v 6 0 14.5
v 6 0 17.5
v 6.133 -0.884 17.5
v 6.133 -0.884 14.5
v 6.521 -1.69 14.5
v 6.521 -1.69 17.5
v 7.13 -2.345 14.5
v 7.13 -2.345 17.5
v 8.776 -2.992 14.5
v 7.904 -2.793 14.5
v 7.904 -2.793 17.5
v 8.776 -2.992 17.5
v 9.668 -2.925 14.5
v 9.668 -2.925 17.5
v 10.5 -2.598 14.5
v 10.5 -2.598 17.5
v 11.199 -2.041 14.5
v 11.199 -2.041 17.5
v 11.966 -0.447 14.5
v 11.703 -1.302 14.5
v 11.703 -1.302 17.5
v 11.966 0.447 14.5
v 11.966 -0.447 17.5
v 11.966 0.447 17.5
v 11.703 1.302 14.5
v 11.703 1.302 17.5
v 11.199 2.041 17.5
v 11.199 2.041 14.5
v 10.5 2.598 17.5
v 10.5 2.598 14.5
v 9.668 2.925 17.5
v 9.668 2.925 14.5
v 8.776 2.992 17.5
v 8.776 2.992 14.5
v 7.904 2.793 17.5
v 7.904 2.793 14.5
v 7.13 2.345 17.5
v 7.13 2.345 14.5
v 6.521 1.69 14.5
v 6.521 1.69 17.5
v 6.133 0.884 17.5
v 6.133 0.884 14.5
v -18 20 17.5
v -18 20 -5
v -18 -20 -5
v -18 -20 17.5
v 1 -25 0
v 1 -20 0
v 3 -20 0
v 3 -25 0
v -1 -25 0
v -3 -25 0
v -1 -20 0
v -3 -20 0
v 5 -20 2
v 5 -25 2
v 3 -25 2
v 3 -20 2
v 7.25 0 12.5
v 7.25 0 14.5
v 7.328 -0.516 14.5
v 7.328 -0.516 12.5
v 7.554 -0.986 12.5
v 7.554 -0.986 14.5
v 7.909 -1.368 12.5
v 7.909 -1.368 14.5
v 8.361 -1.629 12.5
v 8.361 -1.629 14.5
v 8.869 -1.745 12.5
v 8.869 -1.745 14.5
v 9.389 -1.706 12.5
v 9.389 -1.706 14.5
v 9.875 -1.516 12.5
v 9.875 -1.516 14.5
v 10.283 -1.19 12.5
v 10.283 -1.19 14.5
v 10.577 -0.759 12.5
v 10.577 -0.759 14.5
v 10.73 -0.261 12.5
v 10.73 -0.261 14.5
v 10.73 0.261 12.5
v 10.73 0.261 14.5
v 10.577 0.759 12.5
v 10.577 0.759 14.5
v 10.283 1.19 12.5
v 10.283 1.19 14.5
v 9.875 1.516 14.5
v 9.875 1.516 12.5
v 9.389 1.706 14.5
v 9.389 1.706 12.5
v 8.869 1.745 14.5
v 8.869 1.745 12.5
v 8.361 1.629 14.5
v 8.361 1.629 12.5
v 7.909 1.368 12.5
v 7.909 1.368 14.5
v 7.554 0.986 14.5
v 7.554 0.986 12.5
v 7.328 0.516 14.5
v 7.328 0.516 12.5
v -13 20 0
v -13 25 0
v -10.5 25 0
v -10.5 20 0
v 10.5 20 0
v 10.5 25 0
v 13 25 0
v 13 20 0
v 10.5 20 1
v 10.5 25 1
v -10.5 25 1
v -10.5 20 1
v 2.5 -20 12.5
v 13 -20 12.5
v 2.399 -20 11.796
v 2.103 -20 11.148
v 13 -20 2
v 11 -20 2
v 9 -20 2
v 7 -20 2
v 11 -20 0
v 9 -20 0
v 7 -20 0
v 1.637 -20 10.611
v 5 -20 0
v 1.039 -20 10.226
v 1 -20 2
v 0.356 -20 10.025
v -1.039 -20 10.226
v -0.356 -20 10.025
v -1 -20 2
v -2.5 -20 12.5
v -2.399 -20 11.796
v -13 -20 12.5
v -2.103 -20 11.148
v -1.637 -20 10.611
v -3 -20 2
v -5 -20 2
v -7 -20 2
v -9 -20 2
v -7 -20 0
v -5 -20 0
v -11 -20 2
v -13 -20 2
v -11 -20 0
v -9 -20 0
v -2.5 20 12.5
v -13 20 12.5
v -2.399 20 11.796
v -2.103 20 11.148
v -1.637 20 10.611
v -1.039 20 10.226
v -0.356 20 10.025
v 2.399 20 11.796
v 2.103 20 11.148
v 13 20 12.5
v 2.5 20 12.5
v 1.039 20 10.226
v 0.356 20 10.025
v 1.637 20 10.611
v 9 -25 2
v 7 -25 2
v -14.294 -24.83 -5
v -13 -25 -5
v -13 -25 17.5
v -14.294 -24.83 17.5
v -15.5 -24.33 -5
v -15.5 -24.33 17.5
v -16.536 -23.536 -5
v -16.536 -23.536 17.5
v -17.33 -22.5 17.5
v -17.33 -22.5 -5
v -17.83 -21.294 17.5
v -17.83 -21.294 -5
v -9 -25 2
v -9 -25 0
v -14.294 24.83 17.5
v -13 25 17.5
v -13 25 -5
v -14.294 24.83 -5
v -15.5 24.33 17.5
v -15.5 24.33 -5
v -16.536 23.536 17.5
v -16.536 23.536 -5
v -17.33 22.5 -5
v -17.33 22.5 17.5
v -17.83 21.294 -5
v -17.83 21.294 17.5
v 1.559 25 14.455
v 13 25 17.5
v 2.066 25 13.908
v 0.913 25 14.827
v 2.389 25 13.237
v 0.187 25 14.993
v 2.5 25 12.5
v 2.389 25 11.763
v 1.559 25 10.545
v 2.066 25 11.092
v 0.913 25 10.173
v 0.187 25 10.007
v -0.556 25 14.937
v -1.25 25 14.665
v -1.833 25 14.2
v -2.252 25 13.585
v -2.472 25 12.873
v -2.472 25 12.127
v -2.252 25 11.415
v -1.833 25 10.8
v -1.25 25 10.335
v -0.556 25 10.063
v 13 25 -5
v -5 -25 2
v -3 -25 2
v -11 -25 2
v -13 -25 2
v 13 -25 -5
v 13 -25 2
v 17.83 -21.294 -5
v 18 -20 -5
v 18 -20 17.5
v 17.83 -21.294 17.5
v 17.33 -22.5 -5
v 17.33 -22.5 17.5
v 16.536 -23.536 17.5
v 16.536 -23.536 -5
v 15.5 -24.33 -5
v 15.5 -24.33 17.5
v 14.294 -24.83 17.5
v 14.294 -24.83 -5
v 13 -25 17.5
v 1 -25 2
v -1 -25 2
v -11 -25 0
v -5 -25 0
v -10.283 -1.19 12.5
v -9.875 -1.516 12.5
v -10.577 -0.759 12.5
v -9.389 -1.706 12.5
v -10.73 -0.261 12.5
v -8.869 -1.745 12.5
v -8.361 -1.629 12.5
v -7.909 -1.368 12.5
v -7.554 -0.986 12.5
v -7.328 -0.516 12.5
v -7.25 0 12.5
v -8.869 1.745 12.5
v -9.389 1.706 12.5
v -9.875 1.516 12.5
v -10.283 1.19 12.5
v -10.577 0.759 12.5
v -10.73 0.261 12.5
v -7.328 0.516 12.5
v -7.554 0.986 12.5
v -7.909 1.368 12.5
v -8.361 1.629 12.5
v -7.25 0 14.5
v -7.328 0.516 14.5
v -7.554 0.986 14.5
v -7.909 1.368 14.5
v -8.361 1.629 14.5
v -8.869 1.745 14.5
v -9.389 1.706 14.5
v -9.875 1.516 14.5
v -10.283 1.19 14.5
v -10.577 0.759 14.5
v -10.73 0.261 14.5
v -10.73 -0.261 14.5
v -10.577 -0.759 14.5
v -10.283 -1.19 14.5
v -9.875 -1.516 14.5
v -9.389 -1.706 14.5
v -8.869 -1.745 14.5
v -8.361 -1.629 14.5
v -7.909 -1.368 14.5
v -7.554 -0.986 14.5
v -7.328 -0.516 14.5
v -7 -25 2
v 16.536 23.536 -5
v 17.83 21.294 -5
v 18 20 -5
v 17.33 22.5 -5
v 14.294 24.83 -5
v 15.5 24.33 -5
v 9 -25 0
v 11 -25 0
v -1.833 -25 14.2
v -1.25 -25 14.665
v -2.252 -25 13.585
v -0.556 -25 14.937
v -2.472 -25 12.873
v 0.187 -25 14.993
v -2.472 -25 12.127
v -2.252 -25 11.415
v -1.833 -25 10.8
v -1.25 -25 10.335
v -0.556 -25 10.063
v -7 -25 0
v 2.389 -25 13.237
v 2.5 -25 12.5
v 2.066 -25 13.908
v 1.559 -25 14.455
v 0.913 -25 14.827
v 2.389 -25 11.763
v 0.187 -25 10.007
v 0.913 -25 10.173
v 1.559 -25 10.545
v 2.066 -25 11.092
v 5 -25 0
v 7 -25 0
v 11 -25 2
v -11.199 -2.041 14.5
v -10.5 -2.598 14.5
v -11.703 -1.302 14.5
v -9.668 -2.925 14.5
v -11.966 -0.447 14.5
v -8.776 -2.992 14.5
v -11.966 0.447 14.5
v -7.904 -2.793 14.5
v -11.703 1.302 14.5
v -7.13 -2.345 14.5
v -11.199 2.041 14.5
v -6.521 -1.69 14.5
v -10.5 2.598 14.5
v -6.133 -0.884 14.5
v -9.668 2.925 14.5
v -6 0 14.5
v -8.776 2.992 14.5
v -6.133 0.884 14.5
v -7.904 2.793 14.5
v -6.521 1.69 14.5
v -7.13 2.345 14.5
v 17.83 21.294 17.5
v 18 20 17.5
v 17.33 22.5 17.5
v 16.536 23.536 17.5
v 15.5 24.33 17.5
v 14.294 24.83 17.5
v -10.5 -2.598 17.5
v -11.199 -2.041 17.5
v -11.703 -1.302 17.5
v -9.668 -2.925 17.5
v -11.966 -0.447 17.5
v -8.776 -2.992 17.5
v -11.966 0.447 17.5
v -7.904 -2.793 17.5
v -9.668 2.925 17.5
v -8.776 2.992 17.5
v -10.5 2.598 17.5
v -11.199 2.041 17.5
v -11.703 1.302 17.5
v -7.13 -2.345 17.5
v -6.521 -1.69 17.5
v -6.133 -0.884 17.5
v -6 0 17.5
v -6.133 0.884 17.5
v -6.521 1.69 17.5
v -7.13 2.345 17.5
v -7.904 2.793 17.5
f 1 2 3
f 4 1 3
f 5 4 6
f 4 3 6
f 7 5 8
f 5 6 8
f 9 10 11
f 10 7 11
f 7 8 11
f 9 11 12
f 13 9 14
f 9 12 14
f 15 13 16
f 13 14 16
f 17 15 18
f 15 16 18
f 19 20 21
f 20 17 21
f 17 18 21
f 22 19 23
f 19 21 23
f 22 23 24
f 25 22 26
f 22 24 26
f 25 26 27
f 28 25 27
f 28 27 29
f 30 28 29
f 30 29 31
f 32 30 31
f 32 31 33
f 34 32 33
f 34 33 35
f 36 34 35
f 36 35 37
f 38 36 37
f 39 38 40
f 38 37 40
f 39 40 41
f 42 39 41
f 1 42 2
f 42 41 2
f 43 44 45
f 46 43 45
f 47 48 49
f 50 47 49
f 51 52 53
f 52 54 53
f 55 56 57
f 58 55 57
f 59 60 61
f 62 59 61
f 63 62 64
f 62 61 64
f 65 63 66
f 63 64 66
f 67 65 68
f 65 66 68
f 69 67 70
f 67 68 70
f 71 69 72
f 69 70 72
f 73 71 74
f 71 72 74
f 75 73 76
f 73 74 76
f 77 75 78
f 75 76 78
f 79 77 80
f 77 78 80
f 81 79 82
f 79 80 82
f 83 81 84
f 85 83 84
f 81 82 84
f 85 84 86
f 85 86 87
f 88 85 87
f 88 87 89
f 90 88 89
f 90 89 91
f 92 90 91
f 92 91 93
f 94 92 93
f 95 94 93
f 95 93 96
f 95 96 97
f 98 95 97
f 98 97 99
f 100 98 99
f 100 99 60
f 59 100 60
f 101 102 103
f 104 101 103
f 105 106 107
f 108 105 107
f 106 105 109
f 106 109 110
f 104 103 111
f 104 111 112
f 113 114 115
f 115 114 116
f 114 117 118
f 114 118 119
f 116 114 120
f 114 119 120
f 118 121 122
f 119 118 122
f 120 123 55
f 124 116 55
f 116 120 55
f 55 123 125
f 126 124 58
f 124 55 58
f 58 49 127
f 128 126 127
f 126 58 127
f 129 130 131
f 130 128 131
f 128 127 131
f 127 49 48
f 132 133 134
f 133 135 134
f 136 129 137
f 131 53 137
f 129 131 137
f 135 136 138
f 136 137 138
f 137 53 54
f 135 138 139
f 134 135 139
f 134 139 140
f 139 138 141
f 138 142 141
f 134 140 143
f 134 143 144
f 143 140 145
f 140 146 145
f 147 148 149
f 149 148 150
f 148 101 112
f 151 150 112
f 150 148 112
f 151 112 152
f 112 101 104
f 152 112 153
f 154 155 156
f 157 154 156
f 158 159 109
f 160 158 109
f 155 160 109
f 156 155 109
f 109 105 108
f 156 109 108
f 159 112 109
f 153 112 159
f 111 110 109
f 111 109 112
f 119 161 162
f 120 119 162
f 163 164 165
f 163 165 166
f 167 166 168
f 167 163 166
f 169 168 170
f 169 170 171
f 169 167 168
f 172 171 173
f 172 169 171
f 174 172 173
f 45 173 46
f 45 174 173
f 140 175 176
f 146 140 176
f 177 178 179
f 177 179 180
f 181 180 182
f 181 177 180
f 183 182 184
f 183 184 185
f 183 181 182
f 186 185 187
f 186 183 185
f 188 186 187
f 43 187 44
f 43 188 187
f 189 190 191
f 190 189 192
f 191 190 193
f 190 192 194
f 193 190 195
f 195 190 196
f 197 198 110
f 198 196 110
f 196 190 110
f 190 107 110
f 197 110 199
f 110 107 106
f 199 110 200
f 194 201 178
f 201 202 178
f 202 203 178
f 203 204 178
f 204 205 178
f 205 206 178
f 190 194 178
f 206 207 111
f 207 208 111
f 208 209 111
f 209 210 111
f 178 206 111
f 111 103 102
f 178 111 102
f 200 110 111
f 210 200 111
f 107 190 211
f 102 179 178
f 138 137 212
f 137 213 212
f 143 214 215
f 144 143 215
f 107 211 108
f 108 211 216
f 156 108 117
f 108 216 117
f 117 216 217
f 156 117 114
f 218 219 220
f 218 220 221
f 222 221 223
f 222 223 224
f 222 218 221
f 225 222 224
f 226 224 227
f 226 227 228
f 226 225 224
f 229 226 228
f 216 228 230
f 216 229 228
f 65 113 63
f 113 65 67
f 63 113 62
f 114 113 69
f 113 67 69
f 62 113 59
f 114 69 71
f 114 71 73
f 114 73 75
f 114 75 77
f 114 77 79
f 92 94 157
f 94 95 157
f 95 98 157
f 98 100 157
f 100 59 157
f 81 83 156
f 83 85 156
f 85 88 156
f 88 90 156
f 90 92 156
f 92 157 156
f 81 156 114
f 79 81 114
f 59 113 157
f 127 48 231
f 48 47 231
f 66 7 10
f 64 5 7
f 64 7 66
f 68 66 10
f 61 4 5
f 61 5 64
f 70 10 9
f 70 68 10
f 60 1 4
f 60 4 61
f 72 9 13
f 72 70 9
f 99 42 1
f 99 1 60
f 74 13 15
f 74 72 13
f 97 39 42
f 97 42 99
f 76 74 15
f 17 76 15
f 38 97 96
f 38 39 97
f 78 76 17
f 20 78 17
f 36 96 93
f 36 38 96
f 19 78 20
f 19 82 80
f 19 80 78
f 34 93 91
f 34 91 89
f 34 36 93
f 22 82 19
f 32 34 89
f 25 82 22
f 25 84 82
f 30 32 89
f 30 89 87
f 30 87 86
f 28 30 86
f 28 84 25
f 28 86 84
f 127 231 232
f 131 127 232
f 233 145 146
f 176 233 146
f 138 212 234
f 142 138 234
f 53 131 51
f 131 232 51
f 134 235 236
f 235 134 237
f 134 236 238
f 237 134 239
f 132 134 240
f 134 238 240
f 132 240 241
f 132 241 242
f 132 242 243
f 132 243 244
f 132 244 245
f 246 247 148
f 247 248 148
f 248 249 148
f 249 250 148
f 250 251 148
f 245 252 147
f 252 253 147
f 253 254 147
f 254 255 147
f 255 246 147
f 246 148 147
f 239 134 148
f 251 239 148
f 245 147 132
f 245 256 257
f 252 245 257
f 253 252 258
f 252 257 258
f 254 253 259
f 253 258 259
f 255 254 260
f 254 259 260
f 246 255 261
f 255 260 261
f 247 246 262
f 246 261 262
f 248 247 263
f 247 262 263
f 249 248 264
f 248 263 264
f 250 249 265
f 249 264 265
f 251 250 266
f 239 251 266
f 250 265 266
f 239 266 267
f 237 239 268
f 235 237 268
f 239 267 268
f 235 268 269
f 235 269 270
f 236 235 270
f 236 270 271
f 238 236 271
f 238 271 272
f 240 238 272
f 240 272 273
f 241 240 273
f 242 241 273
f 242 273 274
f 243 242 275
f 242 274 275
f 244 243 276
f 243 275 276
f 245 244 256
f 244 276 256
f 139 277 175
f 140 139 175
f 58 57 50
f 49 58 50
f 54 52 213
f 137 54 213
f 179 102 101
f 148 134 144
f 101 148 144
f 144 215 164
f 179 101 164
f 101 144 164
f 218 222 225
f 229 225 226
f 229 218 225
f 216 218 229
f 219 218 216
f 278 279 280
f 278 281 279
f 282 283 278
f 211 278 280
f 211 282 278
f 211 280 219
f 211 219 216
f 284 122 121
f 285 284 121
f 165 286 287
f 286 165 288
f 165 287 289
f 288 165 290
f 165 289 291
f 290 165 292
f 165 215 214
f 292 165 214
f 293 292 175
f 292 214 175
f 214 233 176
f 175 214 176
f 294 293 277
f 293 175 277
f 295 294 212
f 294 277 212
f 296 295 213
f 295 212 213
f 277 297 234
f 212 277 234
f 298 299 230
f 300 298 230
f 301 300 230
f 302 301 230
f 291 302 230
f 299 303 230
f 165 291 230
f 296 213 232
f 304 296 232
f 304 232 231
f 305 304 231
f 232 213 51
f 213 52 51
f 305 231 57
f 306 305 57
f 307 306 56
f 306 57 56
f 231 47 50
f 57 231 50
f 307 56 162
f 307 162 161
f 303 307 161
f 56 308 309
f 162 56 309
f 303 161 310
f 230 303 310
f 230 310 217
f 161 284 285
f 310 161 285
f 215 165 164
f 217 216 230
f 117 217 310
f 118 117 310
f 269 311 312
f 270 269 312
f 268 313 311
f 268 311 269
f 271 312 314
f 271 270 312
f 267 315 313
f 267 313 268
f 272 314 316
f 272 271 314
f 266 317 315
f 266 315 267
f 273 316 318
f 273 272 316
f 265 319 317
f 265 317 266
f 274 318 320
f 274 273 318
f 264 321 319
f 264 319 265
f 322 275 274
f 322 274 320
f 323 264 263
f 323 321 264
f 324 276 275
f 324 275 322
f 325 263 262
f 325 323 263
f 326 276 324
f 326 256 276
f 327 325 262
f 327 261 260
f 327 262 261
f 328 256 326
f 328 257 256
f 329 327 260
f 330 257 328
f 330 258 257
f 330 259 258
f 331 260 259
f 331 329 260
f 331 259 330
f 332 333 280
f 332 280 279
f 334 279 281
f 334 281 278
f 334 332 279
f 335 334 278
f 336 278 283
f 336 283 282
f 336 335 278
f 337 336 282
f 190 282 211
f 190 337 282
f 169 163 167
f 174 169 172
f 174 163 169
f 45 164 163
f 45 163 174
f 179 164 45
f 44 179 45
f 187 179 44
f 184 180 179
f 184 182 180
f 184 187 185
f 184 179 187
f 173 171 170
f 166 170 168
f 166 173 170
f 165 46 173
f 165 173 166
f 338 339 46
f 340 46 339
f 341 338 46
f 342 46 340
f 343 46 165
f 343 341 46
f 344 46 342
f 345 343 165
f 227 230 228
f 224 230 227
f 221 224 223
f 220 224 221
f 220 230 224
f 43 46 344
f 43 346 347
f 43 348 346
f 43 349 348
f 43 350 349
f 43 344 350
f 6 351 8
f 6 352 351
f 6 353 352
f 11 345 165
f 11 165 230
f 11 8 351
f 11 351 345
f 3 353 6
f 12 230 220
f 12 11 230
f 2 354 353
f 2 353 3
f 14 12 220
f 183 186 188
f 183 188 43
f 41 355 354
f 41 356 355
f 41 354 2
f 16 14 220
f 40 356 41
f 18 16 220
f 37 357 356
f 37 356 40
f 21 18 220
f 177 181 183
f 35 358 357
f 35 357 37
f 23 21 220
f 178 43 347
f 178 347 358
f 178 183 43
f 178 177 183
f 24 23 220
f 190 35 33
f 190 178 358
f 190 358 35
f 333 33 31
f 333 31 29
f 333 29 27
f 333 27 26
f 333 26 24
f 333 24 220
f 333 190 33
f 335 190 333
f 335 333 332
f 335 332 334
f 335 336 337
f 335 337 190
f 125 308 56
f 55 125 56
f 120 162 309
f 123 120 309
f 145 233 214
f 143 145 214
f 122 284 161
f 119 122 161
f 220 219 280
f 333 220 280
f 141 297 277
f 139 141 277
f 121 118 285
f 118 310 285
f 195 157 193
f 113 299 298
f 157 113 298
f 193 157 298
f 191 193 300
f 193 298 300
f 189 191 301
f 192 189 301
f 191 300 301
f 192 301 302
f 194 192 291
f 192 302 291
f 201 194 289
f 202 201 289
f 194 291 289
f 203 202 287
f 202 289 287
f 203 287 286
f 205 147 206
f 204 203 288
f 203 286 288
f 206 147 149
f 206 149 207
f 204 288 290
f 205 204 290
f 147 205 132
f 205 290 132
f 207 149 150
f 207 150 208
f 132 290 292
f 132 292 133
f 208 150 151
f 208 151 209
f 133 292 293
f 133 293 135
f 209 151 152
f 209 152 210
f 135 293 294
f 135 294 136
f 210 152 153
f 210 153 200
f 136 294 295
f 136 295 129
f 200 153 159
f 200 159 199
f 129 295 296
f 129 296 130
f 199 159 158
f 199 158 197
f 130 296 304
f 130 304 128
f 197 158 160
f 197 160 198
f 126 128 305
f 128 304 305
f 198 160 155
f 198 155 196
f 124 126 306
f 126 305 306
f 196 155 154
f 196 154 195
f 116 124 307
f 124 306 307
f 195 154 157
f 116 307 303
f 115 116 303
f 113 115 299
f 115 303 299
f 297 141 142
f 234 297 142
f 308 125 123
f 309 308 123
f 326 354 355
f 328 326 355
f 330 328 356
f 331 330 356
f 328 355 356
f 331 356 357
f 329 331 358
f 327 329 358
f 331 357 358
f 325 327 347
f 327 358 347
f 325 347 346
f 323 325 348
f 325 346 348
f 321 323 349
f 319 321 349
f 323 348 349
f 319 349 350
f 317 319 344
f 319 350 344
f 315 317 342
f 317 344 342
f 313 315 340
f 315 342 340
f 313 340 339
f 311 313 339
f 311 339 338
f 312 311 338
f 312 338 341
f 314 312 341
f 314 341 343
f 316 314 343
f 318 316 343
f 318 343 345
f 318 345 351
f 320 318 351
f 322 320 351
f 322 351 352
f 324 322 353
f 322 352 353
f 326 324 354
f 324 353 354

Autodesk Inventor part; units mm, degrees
ref_plane "YZ Plane" through (0, 0, 0) normal (1, 0, 0) x (0, 1, 0)
ref_plane "XZ Plane" through (0, 0, 0) normal (0, 1, 0) x (-1, 0, 0)
ref_plane "XY Plane" through (0, 0, 0) normal (0, 0, 1) x (1, 0, 0)
sketch "Sketch1" plane through (0, 0, 0) normal (0, 0, 1) x (1, 0, 0)
  line L0 (-13, 20) -> (13, 20)
  line L1 (13, 20) -> (13, -20)
  line L2 (13, -20) -> (-13, -20)
  line L3 (-13, -20) -> (-13, 20)
  line L4 (18, 25) -> (-18, 25)
  line L5 (-18, 25) -> (-18, -25)
  line L6 (-18, -25) -> (18, -25)
  line L7 (18, -25) -> (18, 25)
  point P0 (0, 0)
  point P1 (-13, 0)
  point P2 (0, 20)
  dimension "d0" = 26
  dimension "d1" = 40
  dimension "d2" = 5
extrude "Extrusion1" add sketch "Sketch1" along normal blind 12.5
sketch "Sketch3" plane through (0, 0, 12.5) normal (0, 0, 1) x (1, 0, 0)
  line L0 (-2.5, -25) -> (-2.5, -20) projected
  line L1 (13, -20) -> (-13, -20) projected
  line L2 (-13, -20) -> (-13, 20) projected
  line L3 (-13, 20) -> (13, 20) projected
  line L4 (-2.5, 20) -> (-2.5, 25) projected
  line L5 (18, 25) -> (-18, 25) projected
  line L6 (-18, 25) -> (-18, -25) projected
  line L7 (-18, -25) -> (18, -25) projected
  line L8 (-18, -25) -> (18, -25) projected
  line L9 (18, -25) -> (18, 25) projected
  line L10 (18, 25) -> (-18, 25) projected
  line L11 (-13, 20) -> (13, 20) projected
  line L12 (13, 20) -> (13, -20) projected
  line L13 (13, -20) -> (-13, -20) projected
  line L14 (-13, -20) -> (-13, 20) projected
  line L15 (-18, 25) -> (-18, -25) projected
  point P0 (0, 0)
extrude "Extrusion3" add sketch "Sketch3" along normal blind 5
sketch "Sketch4" plane through (0, 0, 0) normal (0, 0, -1) x (-1, 0, 0)
  line L0 (-13, 20) -> (13, 20) projected
  line L1 (-18, 25) -> (18, 25) projected
  line L2 (-10.5, 25) -> (10.5, 25)
  line L3 (10.5, 25) -> (10.5, 20)
  line L4 (10.5, 20) -> (-10.5, 20)
  line L5 (-10.5, 20) -> (-10.5, 25)
  point P0 (0, 0)
  point P1 (0, 25)
  point P2 (0, 25)
  dimension "d11" = 21
extrude "Extrusion4" cut sketch "Sketch4" against normal blind 1
sketch "Sketch5" plane through (-18, -25, 0) normal (0, -1, 0) x (1, 0, 0)
  line L0 (0, 0) -> (36, 0) projected
  line L1 (17, 0) -> (19, 0)
  line L2 (19, 0) -> (19, 2)
  line L3 (19, 2) -> (17, 2)
  line L4 (17, 2) -> (17, 0)
  point P0 (18, 0)
  point P1 (18, 0)
  dimension "d15" = 2
extrude "Extrusion5" cut sketch "Sketch5" against normal up to surface (45 mm away)
pattern_linear "Rectangular Pattern1" count 7 spacing 4 along (1, 0, 0) of "Extrusion5" first direction both ways yes
sketch "Sketch6" plane through (13, -25, 0) normal (0, -1, 0) x (1, 0, 0)
  circle A0 centre (-13, 12.5) radius 2.5
  point P0 (-13, 0)
  dimension "d22" = 12.5
  dimension "d23" = 5
extrude "Extrusion6" cut sketch "Sketch6" against normal through all
sketch "Sketch7" plane through (0, 0, 0) normal (0, 0, -1) x (-1, 0, 0)
  line L0 (-13, -25) -> (-13, 20) projected
  line L1 (-13, 20) -> (-10.5, 20) projected
  line L2 (-10.5, 20) -> (-10.5, 25) projected
  line L3 (-18, 25) -> (-10.5, 25) projected
  line L4 (-18, -25) -> (-18, 25) projected
  line L5 (-13, -25) -> (-18, -25) projected
  line L6 (-18, 25) -> (-13, 25)
  line L7 (-13, 25) -> (-13, -25)
  line L8 (-13, -25) -> (-18, -25)
  line L9 (-18, -25) -> (-18, 25)
  line L10 (13, -25) -> (18, -25)
  line L11 (18, -25) -> (18, 25)
  line L12 (18, 25) -> (13, 25)
  line L13 (13, 25) -> (13, -25)
  line L14 (-18, 25) -> (-10.5, 25) projected
  point P0 (0, 0)
extrude "Extrusion7" add sketch "Sketch7" along normal blind 5 contours L5 L4 L3 L7 L0 | L13 L12 L11 L10
fillet "Fillet3" radius 5 4 edges at (18, 25, 6.25) (18, -25, 6.25) (-18, -25, 6.25) (-18, 25, 6.25)
sketch "Sketch8" plane through (0, 0, 17.5) normal (0, 0, 1) x (1, 0, 0)
  circle A0 centre (-9, 0) radius 3
  point P0 (0, 0)
  dimension "d31" = 6
  dimension "d34" = 9
extrude "Extrusion8" cut sketch "Sketch8" against normal blind 3
sketch "Sketch9" plane through (-9, 0, 14.5) normal (0, 0, 1) x (1, 0, 0)
  circle A0 centre (0, 0) radius 3 projected
  circle A1 centre (0, 0) radius 1.75
  point P0 (9, 0)
  dimension "d37" = 3.5
extrude "Extrusion9" cut sketch "Sketch9" against normal through all contours A1
mirror "Mirror1" about plane through (0, 0, 0) normal (1, 0, 0) of "Extrusion8", "Extrusion9"
properties part number "wire block"
